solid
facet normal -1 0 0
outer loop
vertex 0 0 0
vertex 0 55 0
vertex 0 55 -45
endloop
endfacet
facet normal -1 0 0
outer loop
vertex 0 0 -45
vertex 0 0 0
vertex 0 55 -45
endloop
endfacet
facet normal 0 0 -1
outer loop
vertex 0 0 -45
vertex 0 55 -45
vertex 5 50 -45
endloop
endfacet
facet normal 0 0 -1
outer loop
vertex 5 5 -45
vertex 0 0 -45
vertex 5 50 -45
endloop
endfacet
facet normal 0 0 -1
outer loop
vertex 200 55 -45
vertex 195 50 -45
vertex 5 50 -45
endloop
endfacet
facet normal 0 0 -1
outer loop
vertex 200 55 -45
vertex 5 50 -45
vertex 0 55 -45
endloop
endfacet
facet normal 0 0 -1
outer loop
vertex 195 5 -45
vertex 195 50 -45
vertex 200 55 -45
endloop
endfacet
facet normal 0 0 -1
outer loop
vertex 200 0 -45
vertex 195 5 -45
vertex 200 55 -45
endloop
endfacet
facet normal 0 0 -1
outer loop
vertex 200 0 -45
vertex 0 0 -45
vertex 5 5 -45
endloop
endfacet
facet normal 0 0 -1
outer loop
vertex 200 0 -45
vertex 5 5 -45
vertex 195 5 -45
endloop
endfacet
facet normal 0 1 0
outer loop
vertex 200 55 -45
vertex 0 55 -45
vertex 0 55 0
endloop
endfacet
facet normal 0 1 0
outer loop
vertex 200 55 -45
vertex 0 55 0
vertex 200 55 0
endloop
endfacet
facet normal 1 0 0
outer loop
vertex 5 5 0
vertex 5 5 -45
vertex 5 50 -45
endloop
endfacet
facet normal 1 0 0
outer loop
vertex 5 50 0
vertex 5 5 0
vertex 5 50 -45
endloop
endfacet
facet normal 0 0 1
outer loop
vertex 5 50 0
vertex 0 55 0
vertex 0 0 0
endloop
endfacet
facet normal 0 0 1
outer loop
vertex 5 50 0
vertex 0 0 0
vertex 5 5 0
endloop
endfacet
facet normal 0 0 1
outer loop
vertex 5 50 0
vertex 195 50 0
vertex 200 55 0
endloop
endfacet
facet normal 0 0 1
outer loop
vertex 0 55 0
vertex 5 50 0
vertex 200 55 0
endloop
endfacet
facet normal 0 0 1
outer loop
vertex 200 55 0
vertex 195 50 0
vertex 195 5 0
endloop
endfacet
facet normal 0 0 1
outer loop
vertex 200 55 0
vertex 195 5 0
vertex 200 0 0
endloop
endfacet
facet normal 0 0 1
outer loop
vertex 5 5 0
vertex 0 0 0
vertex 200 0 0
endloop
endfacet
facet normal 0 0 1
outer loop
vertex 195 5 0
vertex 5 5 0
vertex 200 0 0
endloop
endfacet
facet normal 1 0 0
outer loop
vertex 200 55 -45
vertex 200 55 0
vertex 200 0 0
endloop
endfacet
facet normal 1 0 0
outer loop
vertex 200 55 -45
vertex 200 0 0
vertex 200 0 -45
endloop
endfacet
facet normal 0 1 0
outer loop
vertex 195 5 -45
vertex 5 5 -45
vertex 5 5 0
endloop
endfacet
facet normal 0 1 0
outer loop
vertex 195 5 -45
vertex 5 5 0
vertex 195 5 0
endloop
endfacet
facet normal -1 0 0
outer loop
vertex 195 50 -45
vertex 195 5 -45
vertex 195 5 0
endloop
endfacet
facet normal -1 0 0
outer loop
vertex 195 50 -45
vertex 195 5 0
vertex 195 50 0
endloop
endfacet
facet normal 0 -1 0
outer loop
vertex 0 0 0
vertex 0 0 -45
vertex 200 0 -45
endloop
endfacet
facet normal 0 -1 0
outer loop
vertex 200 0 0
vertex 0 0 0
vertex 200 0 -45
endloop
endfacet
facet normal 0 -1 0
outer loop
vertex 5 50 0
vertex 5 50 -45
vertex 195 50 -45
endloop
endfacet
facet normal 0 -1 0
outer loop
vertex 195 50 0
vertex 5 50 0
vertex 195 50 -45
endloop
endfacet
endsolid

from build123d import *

# Parameters (mm, degrees)
SKETCH1_W               = 200
SKETCH1_H               = 45
BOSS_EXTRUDE1_DEPTH     = 55
CUT_EXTRUDE1_DEPTH      = 213.249852768
CUT_EXTRUDE1_DEPTH_BACK = 213.249852768
SKETCH2_W               = 190
SKETCH2_H               = 45


with BuildPart() as part:
    # Sketch1 → Boss-Extrude1 (new body)
    with BuildSketch(Plane(origin=(0, 0, 0), x_dir=(1, 0, 0), z_dir=(0, 1, 0))):
        with Locations((100, 22.5)):
            Rectangle(SKETCH1_W, SKETCH1_H)
    extrude(amount=BOSS_EXTRUDE1_DEPTH)

    # Sketch2 → Cut-Extrude1 (cut, two sides: drawn at the far end of the back side and taken through both)
    with BuildSketch(Plane.XY.offset(-CUT_EXTRUDE1_DEPTH_BACK)):
        with Locations((100, 27.5)):
            Rectangle(SKETCH2_W, SKETCH2_H)
    extrude(amount=CUT_EXTRUDE1_DEPTH + CUT_EXTRUDE1_DEPTH_BACK, mode=Mode.SUBTRACT)


solid = part.part
